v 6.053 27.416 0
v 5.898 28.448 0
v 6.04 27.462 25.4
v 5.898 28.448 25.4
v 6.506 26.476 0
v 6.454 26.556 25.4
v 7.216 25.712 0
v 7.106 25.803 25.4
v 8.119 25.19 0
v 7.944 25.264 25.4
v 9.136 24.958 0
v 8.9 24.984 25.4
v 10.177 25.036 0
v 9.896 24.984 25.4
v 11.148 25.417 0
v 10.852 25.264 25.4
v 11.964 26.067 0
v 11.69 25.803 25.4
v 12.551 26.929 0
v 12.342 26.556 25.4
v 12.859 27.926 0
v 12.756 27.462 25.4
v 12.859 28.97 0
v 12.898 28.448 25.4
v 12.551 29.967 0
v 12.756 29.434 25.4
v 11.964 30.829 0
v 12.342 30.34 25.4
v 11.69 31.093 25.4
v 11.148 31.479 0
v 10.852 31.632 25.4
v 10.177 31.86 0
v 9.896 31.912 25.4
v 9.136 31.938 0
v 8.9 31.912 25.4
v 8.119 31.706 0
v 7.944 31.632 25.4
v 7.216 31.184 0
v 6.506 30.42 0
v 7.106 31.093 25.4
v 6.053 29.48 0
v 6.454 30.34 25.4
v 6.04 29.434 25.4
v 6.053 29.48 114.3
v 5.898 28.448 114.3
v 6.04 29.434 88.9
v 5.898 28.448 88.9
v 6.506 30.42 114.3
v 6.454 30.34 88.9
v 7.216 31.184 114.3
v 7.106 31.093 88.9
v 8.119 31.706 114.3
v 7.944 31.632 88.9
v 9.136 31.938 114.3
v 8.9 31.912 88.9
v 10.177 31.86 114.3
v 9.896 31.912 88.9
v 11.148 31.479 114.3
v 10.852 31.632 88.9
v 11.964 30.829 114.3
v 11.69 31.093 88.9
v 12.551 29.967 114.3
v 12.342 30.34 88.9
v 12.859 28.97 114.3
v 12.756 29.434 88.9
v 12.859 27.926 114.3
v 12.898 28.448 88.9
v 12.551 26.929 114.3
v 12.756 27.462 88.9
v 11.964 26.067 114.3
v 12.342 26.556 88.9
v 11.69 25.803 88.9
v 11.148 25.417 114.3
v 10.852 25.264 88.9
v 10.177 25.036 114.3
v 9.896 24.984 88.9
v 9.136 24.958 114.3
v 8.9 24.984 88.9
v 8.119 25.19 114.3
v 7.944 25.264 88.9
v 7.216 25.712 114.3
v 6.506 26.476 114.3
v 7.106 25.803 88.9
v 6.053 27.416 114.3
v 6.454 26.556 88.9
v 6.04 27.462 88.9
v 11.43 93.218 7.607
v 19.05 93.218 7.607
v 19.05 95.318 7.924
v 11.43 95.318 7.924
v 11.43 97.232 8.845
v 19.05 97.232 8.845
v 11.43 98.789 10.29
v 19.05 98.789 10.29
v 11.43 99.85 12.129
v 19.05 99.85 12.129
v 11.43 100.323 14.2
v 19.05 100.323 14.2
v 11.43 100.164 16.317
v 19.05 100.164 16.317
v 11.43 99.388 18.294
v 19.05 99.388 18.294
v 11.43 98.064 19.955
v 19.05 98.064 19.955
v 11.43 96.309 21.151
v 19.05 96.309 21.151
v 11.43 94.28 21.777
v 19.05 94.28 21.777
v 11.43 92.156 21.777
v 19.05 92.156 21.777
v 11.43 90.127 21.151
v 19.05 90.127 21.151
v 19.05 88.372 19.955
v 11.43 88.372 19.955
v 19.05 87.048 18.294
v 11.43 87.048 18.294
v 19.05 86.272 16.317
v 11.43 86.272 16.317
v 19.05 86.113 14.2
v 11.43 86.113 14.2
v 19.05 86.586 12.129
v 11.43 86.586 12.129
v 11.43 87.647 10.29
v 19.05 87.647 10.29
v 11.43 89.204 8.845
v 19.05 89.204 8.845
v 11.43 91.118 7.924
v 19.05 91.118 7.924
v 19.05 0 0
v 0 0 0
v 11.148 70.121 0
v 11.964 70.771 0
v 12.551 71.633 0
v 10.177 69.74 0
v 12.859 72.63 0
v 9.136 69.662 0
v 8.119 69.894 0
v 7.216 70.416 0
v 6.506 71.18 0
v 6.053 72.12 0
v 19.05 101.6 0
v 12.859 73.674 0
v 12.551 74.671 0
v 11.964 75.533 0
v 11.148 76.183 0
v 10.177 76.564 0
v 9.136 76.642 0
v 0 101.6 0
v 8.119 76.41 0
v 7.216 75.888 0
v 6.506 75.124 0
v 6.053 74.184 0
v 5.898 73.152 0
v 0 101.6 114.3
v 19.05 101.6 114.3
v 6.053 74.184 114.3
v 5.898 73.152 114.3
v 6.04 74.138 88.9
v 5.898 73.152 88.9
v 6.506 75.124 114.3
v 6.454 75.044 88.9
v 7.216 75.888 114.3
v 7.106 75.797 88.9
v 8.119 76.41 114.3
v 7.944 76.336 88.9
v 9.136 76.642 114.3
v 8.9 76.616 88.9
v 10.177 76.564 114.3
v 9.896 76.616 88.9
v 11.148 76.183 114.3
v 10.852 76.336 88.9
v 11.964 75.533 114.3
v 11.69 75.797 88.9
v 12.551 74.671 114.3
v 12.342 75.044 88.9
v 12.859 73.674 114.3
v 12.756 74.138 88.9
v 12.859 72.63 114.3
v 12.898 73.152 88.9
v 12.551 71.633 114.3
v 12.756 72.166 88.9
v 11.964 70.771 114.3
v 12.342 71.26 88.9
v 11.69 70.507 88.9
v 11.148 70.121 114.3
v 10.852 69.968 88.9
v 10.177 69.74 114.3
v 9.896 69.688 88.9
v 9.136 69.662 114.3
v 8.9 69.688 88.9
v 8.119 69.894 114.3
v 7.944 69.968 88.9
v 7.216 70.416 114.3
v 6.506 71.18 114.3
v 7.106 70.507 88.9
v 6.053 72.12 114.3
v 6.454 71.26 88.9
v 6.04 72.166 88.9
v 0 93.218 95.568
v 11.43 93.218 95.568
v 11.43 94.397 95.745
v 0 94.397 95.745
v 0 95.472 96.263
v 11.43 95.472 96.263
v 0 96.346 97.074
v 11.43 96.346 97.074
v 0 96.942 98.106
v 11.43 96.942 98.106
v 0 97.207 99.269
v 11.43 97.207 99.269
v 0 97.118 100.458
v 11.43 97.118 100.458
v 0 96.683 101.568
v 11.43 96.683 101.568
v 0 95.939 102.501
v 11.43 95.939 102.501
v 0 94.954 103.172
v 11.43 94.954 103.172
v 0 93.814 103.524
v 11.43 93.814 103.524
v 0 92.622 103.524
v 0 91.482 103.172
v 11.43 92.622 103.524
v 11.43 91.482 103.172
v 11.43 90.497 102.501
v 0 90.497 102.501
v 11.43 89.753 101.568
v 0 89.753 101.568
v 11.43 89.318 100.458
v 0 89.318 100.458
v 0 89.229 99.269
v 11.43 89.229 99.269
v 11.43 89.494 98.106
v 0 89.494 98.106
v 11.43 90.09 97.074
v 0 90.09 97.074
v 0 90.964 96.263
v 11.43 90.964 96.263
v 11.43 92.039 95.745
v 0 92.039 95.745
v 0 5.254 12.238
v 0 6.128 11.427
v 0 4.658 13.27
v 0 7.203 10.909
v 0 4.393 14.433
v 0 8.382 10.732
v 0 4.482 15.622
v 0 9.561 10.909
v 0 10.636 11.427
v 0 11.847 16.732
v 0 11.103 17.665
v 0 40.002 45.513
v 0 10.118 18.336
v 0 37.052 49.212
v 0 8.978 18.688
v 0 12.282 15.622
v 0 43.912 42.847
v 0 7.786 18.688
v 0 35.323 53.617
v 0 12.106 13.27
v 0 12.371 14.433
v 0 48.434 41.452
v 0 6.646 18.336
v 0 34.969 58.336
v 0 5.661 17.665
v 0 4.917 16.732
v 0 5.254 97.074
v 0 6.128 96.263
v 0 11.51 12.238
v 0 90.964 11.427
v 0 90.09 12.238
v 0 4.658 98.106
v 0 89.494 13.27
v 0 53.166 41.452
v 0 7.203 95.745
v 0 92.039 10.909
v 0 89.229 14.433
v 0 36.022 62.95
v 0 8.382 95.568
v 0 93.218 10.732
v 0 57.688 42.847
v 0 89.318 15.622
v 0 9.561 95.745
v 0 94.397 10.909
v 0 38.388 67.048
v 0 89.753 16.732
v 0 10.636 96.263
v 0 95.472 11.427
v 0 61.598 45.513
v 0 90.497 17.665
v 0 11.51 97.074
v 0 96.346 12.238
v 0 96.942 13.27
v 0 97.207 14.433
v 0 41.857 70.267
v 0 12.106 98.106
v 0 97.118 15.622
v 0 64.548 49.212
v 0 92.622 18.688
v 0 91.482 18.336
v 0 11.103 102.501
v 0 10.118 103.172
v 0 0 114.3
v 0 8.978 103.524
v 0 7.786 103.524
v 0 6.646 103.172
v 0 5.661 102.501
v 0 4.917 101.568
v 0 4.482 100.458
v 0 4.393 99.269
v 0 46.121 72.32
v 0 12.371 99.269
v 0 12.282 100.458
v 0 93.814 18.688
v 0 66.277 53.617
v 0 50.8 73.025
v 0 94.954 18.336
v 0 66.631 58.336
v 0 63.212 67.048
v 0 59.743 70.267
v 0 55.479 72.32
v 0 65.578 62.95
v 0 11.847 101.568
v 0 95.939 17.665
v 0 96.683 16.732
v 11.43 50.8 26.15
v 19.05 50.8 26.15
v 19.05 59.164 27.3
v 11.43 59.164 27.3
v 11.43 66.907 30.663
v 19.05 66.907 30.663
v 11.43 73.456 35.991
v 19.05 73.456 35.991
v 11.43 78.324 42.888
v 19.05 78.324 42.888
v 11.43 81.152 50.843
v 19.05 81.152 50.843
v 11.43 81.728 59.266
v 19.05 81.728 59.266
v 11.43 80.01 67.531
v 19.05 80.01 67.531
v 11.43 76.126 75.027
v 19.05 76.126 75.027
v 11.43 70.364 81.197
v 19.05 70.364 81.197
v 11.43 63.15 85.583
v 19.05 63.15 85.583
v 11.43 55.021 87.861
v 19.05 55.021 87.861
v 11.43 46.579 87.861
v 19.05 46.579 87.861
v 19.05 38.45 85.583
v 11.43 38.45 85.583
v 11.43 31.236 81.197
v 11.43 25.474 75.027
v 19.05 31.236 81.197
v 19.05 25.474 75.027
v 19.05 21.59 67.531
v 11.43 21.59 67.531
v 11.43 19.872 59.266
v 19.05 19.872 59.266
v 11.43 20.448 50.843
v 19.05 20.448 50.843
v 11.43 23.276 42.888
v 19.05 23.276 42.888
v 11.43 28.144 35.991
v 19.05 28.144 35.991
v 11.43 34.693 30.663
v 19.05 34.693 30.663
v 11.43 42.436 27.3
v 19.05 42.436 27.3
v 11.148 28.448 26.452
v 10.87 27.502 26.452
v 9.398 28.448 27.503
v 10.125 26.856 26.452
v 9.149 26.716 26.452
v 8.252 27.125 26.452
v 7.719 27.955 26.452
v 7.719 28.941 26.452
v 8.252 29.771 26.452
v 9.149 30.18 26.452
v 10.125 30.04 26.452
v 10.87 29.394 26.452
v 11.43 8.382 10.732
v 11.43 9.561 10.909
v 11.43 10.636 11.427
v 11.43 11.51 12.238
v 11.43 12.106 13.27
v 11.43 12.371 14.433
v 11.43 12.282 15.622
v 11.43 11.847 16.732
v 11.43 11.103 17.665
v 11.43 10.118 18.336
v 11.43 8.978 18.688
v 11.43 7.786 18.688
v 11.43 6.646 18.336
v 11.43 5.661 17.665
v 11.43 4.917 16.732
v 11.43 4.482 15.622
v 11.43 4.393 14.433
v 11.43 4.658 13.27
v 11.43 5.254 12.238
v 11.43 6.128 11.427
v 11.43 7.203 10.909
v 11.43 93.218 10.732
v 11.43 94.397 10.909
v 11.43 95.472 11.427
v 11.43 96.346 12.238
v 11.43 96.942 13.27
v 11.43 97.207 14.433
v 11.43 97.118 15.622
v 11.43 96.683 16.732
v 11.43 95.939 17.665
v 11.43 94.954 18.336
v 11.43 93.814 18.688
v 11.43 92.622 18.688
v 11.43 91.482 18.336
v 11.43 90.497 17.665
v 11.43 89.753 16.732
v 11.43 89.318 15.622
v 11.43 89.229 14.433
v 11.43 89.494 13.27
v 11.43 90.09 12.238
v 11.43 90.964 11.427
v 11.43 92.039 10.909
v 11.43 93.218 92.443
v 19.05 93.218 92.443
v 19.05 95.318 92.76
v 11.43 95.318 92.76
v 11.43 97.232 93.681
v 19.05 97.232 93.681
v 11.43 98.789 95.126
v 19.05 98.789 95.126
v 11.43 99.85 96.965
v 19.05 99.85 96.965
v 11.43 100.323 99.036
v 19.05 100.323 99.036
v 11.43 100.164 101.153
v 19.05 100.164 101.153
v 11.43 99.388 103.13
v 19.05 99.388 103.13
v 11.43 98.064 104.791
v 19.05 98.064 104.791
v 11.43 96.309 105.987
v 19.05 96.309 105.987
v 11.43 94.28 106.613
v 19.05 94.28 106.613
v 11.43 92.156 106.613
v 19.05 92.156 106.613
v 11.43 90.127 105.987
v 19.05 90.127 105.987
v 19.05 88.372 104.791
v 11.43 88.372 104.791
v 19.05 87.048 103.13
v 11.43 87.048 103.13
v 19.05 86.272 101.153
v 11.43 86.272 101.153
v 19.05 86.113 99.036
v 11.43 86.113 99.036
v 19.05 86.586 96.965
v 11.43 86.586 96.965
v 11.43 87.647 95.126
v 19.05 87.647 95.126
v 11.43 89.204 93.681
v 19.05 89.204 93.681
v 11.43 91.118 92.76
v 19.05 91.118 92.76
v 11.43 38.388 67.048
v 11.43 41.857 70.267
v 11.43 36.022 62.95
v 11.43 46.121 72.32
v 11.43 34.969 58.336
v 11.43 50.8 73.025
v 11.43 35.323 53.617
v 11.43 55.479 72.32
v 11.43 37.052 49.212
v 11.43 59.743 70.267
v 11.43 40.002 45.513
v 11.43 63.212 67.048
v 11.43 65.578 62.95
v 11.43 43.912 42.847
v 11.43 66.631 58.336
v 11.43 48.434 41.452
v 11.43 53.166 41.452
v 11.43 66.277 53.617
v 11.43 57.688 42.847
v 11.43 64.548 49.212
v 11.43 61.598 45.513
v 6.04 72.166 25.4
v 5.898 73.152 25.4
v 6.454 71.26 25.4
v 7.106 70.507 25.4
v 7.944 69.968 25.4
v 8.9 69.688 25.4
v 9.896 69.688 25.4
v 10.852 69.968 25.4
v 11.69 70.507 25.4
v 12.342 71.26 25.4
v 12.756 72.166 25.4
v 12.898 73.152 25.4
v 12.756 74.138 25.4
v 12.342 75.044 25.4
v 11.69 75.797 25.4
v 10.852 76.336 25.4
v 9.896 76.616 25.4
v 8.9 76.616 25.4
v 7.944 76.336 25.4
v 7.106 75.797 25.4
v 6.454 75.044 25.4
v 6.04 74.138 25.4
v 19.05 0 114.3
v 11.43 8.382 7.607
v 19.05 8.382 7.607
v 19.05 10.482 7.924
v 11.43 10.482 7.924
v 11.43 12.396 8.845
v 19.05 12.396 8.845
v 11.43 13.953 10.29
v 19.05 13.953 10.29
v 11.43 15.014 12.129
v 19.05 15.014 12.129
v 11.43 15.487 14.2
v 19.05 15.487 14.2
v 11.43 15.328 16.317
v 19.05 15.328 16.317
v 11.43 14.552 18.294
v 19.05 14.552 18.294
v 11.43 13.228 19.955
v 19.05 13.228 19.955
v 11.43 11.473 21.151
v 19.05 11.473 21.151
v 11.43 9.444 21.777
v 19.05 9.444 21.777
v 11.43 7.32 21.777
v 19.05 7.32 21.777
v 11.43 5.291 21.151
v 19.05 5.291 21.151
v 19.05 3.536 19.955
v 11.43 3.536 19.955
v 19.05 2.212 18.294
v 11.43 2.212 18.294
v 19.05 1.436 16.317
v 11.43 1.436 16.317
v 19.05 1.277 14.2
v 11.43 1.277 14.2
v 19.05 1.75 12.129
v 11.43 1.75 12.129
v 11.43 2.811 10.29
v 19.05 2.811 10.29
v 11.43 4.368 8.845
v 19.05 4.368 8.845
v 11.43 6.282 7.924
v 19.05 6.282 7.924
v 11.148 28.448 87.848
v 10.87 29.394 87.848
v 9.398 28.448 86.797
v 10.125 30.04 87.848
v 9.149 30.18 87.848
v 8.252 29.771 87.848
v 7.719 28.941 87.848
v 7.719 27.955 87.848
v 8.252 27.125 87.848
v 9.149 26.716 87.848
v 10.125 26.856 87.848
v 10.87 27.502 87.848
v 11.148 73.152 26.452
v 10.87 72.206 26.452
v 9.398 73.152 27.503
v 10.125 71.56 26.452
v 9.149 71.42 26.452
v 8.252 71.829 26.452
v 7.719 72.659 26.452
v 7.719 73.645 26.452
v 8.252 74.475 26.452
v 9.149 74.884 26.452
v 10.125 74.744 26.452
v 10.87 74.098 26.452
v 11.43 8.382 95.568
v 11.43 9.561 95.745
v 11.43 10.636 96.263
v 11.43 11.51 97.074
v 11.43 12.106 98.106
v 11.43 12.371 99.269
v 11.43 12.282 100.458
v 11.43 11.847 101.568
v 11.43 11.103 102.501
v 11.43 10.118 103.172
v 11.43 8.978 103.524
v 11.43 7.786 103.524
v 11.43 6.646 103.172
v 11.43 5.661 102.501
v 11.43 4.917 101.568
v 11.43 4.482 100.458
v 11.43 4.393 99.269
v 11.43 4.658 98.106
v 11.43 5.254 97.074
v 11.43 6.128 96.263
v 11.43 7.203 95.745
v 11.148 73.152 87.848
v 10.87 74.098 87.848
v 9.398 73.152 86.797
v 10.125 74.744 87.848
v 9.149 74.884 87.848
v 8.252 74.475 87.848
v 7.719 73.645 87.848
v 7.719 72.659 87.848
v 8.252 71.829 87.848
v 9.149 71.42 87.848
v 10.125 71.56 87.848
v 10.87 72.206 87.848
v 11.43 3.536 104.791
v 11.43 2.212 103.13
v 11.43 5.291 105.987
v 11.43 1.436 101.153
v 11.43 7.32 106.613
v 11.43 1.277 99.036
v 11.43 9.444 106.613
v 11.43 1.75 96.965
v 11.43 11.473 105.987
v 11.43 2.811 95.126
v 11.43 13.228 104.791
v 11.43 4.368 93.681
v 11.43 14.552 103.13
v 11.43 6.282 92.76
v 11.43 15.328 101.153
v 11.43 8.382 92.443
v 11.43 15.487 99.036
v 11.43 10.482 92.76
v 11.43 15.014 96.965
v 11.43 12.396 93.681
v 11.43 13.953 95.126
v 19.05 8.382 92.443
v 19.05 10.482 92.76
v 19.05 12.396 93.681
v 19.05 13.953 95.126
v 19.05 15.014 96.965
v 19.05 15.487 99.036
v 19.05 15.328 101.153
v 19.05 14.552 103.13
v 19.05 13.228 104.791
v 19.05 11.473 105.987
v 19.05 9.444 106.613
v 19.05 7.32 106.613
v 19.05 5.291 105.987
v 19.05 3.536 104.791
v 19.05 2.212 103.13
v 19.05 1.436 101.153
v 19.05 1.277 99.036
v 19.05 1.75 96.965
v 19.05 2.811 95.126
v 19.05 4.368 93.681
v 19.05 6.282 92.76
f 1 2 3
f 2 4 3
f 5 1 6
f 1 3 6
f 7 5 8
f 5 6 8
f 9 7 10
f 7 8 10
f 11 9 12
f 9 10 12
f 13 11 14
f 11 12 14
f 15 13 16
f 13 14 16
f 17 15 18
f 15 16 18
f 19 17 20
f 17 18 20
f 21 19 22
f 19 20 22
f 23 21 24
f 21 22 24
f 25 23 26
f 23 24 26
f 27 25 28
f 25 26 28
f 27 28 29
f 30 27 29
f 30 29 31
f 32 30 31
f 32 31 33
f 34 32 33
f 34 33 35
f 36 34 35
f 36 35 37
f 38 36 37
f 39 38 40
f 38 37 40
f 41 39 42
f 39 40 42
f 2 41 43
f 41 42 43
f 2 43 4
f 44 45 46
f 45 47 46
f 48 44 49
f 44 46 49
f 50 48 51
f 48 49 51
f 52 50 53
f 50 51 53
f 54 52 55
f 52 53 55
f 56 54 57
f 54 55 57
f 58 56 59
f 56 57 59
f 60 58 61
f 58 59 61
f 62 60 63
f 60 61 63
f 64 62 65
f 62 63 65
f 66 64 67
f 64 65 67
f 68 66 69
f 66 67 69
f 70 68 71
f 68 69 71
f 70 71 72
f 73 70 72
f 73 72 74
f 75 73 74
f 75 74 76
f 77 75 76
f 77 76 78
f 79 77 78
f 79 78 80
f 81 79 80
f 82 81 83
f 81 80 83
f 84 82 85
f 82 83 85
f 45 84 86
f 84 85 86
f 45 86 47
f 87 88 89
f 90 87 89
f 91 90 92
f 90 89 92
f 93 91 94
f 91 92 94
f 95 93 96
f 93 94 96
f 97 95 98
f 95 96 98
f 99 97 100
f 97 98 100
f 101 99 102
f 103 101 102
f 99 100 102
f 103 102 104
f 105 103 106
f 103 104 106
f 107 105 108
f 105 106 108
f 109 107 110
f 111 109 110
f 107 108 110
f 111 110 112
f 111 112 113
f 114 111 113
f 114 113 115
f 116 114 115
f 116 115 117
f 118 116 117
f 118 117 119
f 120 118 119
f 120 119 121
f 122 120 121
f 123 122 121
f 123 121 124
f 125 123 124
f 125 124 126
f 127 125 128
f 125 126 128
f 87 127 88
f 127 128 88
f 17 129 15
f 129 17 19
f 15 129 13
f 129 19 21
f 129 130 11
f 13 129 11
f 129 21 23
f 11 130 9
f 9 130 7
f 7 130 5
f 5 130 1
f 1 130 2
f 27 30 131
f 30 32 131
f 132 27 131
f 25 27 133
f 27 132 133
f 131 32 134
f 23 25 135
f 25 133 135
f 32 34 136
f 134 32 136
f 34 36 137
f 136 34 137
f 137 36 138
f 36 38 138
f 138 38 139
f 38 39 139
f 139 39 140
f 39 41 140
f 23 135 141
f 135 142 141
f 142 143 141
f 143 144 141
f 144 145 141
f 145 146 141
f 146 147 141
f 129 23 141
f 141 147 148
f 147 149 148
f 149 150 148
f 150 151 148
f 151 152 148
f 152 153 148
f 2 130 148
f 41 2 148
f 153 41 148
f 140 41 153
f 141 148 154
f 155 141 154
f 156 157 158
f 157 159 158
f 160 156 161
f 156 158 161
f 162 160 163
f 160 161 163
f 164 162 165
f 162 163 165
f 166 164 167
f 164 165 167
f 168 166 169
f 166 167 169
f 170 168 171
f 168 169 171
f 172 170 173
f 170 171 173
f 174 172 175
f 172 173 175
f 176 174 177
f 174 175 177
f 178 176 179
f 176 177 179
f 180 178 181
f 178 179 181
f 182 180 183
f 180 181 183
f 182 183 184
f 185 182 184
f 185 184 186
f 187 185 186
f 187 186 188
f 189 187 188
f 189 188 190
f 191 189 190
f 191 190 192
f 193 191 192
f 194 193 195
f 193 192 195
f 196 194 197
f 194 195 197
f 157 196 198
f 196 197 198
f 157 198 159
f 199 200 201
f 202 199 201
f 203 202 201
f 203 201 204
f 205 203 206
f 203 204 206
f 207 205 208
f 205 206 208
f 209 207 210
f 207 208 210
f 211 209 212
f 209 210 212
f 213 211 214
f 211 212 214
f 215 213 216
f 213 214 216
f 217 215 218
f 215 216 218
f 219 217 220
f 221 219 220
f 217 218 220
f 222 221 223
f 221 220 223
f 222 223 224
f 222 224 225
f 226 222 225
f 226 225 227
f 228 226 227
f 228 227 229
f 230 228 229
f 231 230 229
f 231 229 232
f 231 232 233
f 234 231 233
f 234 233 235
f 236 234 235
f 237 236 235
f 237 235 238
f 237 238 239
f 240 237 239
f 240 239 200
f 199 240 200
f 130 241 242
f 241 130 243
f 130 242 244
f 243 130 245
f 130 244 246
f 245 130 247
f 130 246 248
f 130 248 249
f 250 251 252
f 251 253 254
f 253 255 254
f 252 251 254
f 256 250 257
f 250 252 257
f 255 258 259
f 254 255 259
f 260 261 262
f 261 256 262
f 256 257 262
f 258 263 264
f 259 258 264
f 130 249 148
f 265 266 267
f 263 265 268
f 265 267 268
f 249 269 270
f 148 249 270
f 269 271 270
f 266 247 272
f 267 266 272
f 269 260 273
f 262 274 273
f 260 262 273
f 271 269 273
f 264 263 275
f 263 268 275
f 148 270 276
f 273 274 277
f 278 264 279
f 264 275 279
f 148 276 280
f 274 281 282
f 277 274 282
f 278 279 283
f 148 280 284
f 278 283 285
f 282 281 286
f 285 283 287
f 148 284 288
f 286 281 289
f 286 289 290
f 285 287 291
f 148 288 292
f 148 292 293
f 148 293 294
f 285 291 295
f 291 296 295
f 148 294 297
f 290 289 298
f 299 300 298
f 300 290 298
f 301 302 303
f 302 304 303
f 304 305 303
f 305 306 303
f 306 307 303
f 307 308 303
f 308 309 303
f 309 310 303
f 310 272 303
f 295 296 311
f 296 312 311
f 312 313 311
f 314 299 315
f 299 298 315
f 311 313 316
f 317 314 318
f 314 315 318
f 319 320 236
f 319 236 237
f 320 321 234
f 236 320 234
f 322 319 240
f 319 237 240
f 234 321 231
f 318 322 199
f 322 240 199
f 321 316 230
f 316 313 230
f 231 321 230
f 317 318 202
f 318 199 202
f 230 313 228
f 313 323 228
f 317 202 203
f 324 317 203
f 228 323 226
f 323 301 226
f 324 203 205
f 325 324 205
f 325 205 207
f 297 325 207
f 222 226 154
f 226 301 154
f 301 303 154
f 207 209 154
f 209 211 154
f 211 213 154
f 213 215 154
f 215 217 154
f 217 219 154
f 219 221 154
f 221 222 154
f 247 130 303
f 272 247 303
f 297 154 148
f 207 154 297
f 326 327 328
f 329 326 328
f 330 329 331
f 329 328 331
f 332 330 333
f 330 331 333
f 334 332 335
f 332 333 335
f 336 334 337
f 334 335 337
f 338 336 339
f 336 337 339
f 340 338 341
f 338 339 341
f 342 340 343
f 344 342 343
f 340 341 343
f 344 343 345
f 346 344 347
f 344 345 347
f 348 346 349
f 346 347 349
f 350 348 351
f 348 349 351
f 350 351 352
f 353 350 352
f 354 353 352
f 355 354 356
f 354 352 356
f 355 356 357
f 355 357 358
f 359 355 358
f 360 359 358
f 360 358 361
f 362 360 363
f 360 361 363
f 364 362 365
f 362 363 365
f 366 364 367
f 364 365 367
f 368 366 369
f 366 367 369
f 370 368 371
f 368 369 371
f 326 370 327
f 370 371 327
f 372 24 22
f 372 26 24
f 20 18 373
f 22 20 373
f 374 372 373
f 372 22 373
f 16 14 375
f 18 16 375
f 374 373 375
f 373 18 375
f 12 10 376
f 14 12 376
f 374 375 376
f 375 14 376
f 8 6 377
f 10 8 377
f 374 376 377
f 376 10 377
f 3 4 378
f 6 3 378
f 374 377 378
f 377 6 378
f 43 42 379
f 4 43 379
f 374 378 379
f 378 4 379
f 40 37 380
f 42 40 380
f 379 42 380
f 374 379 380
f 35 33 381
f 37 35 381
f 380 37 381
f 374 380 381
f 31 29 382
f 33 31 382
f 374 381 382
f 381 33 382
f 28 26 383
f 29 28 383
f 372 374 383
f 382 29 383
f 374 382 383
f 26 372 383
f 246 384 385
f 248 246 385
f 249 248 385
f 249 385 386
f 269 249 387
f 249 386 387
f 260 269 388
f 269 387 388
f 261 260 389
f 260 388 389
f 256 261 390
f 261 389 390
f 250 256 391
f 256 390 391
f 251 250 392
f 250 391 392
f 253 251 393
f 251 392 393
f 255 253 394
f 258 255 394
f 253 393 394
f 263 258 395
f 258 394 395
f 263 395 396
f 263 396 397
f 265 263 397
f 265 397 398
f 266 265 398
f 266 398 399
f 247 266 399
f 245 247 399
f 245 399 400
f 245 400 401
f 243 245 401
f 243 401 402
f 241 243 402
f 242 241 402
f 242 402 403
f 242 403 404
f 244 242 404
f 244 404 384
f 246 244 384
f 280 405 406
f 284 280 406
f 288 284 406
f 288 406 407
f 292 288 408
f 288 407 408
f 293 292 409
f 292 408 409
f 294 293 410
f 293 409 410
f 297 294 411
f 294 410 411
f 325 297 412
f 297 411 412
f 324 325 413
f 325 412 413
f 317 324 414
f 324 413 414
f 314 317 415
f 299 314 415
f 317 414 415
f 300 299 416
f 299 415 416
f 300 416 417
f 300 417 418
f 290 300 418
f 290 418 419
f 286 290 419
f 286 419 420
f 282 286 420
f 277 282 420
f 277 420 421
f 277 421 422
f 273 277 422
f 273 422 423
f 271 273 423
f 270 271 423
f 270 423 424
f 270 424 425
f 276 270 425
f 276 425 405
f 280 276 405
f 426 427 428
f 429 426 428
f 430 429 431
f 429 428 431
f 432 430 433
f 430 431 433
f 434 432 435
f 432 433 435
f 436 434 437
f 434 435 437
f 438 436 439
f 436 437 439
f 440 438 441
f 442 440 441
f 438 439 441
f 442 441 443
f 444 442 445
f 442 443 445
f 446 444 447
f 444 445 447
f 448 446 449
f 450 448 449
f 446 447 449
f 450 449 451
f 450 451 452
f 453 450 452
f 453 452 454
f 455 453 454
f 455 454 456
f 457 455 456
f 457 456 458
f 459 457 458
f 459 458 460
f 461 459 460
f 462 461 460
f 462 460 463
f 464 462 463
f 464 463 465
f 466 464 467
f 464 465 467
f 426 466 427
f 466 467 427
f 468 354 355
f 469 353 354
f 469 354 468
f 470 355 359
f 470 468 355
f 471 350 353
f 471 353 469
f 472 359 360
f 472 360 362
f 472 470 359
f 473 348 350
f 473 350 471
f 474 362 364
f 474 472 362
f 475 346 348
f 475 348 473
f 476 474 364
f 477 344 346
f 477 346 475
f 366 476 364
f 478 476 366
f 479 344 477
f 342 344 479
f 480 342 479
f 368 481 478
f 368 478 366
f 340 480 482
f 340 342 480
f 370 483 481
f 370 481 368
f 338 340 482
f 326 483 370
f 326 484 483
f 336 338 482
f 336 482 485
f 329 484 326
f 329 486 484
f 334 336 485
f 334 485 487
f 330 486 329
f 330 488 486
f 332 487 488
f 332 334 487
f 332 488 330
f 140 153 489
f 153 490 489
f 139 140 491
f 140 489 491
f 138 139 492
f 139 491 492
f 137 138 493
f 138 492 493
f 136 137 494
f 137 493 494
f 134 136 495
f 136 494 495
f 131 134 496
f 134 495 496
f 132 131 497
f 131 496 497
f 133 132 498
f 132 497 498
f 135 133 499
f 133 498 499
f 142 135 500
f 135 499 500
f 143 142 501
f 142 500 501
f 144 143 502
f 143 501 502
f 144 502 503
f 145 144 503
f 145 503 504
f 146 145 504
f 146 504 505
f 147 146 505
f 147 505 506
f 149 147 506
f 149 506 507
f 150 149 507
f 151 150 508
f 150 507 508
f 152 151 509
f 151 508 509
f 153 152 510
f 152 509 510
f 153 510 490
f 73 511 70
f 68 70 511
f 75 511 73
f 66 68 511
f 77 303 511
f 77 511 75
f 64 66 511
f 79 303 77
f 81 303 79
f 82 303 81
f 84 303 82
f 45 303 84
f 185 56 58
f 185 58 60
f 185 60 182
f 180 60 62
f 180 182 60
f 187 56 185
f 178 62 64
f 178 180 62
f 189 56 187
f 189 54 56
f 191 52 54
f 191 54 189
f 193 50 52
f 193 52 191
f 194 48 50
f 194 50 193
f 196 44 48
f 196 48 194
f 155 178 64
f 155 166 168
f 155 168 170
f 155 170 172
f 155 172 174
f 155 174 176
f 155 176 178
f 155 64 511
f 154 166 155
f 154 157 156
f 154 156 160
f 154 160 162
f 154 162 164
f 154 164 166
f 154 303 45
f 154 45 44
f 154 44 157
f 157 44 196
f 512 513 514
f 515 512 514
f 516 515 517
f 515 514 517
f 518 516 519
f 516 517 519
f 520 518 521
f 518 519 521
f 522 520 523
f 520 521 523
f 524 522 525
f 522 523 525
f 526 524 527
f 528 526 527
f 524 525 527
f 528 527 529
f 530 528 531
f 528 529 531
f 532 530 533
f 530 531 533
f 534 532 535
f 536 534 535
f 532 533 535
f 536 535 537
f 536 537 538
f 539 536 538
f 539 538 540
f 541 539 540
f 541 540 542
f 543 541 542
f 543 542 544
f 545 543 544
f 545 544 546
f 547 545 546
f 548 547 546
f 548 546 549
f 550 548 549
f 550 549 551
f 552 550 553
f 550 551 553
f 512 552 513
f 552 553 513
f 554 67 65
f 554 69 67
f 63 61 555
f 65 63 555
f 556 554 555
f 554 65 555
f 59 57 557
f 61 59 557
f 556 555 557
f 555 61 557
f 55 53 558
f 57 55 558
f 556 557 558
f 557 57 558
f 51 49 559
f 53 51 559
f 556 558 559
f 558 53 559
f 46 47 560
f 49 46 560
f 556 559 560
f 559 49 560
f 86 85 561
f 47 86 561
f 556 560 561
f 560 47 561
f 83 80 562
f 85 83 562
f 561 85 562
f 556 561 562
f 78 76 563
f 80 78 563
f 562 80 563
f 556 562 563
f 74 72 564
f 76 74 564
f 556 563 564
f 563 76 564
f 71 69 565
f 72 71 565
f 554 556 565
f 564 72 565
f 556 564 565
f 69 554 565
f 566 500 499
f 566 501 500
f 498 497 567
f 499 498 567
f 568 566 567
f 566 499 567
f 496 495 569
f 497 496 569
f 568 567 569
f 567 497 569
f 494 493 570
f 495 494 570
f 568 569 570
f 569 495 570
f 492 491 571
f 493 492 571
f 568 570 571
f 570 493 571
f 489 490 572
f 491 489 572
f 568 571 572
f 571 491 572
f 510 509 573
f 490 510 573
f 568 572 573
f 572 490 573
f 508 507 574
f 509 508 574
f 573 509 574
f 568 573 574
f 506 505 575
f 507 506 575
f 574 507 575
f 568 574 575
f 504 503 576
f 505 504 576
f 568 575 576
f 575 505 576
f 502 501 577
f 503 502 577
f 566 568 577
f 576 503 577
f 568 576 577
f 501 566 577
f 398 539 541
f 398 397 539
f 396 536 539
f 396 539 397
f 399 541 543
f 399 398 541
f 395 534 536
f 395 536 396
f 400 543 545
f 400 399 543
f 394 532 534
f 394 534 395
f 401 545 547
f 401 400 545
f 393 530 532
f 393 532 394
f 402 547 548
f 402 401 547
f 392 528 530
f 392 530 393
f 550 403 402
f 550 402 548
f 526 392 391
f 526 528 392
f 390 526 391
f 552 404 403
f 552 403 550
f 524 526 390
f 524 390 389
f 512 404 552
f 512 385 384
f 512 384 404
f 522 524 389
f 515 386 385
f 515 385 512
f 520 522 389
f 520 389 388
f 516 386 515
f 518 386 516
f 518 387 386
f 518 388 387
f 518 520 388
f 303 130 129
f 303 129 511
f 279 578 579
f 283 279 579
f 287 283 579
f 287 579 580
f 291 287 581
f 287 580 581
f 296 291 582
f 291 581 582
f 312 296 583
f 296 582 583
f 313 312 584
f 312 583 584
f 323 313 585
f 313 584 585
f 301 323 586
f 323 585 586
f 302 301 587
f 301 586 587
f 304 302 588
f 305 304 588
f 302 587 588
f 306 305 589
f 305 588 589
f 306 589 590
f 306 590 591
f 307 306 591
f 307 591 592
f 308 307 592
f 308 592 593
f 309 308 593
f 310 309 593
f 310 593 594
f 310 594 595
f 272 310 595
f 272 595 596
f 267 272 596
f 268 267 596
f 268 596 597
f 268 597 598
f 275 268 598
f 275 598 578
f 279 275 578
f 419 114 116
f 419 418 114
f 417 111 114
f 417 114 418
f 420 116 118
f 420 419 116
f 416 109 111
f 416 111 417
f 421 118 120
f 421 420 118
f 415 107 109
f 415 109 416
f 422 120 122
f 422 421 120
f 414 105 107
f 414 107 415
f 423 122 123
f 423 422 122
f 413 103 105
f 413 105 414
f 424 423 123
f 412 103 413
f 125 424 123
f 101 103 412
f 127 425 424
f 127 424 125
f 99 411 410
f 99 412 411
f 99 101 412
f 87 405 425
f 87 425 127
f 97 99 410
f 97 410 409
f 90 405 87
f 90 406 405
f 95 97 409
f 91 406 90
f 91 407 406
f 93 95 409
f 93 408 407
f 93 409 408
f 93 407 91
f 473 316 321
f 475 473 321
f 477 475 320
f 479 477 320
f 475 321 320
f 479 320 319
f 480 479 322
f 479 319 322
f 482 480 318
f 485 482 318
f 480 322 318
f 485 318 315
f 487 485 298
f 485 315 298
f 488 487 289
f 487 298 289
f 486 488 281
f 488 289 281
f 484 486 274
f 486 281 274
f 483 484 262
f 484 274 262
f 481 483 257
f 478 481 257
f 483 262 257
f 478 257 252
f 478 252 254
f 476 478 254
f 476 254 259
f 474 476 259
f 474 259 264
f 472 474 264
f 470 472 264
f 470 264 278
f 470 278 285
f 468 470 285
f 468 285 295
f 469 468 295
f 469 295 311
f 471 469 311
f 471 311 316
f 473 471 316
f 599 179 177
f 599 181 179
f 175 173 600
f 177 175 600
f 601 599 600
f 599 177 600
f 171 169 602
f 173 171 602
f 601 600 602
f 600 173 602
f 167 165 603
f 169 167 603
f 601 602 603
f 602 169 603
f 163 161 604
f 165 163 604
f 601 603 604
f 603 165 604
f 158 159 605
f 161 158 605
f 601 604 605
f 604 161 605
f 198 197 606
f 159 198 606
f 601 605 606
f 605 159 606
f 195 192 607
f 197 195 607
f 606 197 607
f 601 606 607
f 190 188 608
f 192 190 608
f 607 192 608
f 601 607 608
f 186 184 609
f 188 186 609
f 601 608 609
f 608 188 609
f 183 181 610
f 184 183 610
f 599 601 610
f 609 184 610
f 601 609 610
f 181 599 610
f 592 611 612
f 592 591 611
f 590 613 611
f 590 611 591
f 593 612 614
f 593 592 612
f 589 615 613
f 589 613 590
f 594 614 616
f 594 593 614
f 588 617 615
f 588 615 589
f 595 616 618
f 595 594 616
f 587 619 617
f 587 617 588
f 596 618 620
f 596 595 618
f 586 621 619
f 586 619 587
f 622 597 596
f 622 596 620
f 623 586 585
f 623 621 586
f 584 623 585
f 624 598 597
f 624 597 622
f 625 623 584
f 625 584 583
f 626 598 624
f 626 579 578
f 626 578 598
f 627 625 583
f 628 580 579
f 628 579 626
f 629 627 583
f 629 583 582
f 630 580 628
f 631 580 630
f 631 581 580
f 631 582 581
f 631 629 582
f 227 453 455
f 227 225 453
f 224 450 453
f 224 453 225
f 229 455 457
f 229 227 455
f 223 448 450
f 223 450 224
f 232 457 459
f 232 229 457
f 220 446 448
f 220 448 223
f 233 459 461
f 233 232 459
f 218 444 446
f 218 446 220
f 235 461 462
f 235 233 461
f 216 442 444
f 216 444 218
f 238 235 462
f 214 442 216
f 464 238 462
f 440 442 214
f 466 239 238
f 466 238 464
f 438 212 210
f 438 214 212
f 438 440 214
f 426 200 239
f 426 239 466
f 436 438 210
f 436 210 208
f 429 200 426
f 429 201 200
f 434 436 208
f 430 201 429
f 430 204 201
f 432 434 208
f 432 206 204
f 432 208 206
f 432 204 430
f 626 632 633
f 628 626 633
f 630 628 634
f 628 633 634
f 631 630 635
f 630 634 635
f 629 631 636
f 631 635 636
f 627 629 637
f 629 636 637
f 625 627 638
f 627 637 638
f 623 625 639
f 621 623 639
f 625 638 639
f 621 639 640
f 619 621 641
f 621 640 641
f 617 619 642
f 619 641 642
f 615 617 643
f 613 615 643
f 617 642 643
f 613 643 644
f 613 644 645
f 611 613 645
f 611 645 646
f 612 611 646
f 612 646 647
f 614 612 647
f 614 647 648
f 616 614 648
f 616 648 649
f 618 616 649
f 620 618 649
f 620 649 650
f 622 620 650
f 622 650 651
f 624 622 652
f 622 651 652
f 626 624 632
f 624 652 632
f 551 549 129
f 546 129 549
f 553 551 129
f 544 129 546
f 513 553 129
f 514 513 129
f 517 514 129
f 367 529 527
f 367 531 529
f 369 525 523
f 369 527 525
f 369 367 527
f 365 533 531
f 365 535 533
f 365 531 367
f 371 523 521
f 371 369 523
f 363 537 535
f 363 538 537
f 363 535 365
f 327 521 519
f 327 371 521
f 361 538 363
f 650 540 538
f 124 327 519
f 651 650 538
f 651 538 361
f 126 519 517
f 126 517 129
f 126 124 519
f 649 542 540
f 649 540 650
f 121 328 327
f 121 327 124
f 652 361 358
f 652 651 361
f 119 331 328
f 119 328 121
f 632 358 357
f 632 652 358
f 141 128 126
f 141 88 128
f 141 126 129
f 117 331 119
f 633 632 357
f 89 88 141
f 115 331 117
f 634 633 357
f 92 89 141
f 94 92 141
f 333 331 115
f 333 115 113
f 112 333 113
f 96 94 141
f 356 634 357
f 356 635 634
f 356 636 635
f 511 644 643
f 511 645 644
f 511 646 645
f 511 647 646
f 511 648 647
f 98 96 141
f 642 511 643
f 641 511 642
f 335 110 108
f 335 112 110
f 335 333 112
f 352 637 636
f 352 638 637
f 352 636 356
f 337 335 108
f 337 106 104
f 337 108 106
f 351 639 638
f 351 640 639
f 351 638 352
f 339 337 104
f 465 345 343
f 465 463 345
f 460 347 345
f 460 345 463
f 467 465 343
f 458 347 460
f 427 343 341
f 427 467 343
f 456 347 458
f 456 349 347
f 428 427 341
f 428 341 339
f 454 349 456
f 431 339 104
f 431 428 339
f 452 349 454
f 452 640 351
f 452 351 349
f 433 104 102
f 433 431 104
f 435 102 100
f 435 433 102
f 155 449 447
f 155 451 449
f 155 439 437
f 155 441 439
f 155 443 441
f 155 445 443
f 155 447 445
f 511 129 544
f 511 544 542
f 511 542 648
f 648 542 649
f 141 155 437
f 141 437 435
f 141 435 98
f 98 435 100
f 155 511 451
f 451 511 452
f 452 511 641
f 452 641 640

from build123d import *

# Parameters (mm, degrees)
SKETCH1_W                       = 101.6
SKETCH1_H                       = 114.3
BOSS_EXTRUDE1_DEPTH             = 19.05
SKETCH2_R                       = 30.999938
CUT_EXTRUDE1_DEPTH              = 7.62
SKETCH4_R                       = 15.875
CUT_EXTRUDE2_DEPTH              = 155.110195964
SKETCH5_R                       = 4.0005
CUT_EXTRUDE4_DEPTH              = 155.110195964
SKETCH10_R                      = 7.12499972
CUT_EXTRUDE5_DEPTH              = 7.62
TAP_DRILL_FOR_M8X1_0_TAP2_D     = 7
TAP_DRILL_FOR_M8X1_0_TAP2_DEPTH = 25.4
TAP_DRILL_FOR_M8X1_0_TAP2_TIP   = 2.103012167
TAP_DRILL_FOR_M8X1_0_TAP3_D     = 7
TAP_DRILL_FOR_M8X1_0_TAP3_DEPTH = 25.4
TAP_DRILL_FOR_M8X1_0_TAP3_TIP   = 2.103012167


with BuildPart() as part:
    # Sketch1 → Boss-Extrude1 (new body)
    with BuildSketch(Plane.YZ):
        with Locations((50.8, 57.15)):
            Rectangle(SKETCH1_W, SKETCH1_H)
    extrude(amount=BOSS_EXTRUDE1_DEPTH)

    # Sketch2 → Cut-Extrude1 (cut)
    with BuildSketch(Plane.YZ.offset(19.05)):
        with Locations(Location((50.8, 57.15, 0), (0, 0, 270))):
            Circle(SKETCH2_R)
    extrude(amount=-CUT_EXTRUDE1_DEPTH, mode=Mode.SUBTRACT)

    # Sketch4 → Cut-Extrude2 (cut, through all)
    with BuildSketch(Plane(origin=(0, 0, 0), x_dir=(0, -1, 0), z_dir=(-1, 0, 0))):
        with Locations(Location((-50.8, 57.15, 0), (0, 0, 90))):
            Circle(SKETCH4_R)
    extrude(amount=-CUT_EXTRUDE2_DEPTH, mode=Mode.SUBTRACT)

    # Sketch5 → Cut-Extrude4 (cut, through all)
    with BuildSketch(Plane.YZ.offset(19.05)):
        with Locations(Location((8.382, 99.568, 0), (0, 0, 270))):
            Circle(SKETCH5_R)
        with Locations(Location((93.218, 99.568, 0), (0, 0, 270))):
            Circle(SKETCH5_R)
        with Locations(Location((93.218, 14.732, 0), (0, 0, 270))):
            Circle(SKETCH5_R)
        with Locations(Location((8.382, 14.732, 0), (0, 0, 270))):
            Circle(SKETCH5_R)
    extrude(amount=-CUT_EXTRUDE4_DEPTH, mode=Mode.SUBTRACT)

    # Sketch10 → Cut-Extrude5 (cut)
    with BuildSketch(Plane.YZ.offset(19.05)):
        with Locations(Location((8.382, 99.568, 0), (0, 0, 270))):
            Circle(SKETCH10_R)
        with Locations(Location((93.218, 99.568, 0), (0, 0, 270))):
            Circle(SKETCH10_R)
        with Locations(Location((93.218, 14.732, 0), (0, 0, 270))):
            Circle(SKETCH10_R)
        with Locations(Location((8.382, 14.732, 0), (0, 0, 270))):
            Circle(SKETCH10_R)
    extrude(amount=-CUT_EXTRUDE5_DEPTH, mode=Mode.SUBTRACT)

    # Tap Drill for M8x1.0 Tap2
    with Locations(Plane.XY.offset(114.3)):
        with Locations((9.398, 73.152), (9.398, 28.448)):
            Hole(TAP_DRILL_FOR_M8X1_0_TAP2_D / 2, depth=TAP_DRILL_FOR_M8X1_0_TAP2_DEPTH)
            with Locations((0, 0, -(TAP_DRILL_FOR_M8X1_0_TAP2_DEPTH + TAP_DRILL_FOR_M8X1_0_TAP2_TIP / 2))):  # 118° drill point
                Cone(0, TAP_DRILL_FOR_M8X1_0_TAP2_D / 2, TAP_DRILL_FOR_M8X1_0_TAP2_TIP, mode=Mode.SUBTRACT)

    # Tap Drill for M8x1.0 Tap3
    with Locations(Plane(origin=(0, 0, 0), x_dir=(1, 0, 0), z_dir=(0, 0, -1))):
        with Locations((9.398, -73.152), (9.398, -28.448)):
            Hole(TAP_DRILL_FOR_M8X1_0_TAP3_D / 2, depth=TAP_DRILL_FOR_M8X1_0_TAP3_DEPTH)
            with Locations((0, 0, -(TAP_DRILL_FOR_M8X1_0_TAP3_DEPTH + TAP_DRILL_FOR_M8X1_0_TAP3_TIP / 2))):  # 118° drill point
                Cone(0, TAP_DRILL_FOR_M8X1_0_TAP3_D / 2, TAP_DRILL_FOR_M8X1_0_TAP3_TIP, mode=Mode.SUBTRACT)


solid = part.part
